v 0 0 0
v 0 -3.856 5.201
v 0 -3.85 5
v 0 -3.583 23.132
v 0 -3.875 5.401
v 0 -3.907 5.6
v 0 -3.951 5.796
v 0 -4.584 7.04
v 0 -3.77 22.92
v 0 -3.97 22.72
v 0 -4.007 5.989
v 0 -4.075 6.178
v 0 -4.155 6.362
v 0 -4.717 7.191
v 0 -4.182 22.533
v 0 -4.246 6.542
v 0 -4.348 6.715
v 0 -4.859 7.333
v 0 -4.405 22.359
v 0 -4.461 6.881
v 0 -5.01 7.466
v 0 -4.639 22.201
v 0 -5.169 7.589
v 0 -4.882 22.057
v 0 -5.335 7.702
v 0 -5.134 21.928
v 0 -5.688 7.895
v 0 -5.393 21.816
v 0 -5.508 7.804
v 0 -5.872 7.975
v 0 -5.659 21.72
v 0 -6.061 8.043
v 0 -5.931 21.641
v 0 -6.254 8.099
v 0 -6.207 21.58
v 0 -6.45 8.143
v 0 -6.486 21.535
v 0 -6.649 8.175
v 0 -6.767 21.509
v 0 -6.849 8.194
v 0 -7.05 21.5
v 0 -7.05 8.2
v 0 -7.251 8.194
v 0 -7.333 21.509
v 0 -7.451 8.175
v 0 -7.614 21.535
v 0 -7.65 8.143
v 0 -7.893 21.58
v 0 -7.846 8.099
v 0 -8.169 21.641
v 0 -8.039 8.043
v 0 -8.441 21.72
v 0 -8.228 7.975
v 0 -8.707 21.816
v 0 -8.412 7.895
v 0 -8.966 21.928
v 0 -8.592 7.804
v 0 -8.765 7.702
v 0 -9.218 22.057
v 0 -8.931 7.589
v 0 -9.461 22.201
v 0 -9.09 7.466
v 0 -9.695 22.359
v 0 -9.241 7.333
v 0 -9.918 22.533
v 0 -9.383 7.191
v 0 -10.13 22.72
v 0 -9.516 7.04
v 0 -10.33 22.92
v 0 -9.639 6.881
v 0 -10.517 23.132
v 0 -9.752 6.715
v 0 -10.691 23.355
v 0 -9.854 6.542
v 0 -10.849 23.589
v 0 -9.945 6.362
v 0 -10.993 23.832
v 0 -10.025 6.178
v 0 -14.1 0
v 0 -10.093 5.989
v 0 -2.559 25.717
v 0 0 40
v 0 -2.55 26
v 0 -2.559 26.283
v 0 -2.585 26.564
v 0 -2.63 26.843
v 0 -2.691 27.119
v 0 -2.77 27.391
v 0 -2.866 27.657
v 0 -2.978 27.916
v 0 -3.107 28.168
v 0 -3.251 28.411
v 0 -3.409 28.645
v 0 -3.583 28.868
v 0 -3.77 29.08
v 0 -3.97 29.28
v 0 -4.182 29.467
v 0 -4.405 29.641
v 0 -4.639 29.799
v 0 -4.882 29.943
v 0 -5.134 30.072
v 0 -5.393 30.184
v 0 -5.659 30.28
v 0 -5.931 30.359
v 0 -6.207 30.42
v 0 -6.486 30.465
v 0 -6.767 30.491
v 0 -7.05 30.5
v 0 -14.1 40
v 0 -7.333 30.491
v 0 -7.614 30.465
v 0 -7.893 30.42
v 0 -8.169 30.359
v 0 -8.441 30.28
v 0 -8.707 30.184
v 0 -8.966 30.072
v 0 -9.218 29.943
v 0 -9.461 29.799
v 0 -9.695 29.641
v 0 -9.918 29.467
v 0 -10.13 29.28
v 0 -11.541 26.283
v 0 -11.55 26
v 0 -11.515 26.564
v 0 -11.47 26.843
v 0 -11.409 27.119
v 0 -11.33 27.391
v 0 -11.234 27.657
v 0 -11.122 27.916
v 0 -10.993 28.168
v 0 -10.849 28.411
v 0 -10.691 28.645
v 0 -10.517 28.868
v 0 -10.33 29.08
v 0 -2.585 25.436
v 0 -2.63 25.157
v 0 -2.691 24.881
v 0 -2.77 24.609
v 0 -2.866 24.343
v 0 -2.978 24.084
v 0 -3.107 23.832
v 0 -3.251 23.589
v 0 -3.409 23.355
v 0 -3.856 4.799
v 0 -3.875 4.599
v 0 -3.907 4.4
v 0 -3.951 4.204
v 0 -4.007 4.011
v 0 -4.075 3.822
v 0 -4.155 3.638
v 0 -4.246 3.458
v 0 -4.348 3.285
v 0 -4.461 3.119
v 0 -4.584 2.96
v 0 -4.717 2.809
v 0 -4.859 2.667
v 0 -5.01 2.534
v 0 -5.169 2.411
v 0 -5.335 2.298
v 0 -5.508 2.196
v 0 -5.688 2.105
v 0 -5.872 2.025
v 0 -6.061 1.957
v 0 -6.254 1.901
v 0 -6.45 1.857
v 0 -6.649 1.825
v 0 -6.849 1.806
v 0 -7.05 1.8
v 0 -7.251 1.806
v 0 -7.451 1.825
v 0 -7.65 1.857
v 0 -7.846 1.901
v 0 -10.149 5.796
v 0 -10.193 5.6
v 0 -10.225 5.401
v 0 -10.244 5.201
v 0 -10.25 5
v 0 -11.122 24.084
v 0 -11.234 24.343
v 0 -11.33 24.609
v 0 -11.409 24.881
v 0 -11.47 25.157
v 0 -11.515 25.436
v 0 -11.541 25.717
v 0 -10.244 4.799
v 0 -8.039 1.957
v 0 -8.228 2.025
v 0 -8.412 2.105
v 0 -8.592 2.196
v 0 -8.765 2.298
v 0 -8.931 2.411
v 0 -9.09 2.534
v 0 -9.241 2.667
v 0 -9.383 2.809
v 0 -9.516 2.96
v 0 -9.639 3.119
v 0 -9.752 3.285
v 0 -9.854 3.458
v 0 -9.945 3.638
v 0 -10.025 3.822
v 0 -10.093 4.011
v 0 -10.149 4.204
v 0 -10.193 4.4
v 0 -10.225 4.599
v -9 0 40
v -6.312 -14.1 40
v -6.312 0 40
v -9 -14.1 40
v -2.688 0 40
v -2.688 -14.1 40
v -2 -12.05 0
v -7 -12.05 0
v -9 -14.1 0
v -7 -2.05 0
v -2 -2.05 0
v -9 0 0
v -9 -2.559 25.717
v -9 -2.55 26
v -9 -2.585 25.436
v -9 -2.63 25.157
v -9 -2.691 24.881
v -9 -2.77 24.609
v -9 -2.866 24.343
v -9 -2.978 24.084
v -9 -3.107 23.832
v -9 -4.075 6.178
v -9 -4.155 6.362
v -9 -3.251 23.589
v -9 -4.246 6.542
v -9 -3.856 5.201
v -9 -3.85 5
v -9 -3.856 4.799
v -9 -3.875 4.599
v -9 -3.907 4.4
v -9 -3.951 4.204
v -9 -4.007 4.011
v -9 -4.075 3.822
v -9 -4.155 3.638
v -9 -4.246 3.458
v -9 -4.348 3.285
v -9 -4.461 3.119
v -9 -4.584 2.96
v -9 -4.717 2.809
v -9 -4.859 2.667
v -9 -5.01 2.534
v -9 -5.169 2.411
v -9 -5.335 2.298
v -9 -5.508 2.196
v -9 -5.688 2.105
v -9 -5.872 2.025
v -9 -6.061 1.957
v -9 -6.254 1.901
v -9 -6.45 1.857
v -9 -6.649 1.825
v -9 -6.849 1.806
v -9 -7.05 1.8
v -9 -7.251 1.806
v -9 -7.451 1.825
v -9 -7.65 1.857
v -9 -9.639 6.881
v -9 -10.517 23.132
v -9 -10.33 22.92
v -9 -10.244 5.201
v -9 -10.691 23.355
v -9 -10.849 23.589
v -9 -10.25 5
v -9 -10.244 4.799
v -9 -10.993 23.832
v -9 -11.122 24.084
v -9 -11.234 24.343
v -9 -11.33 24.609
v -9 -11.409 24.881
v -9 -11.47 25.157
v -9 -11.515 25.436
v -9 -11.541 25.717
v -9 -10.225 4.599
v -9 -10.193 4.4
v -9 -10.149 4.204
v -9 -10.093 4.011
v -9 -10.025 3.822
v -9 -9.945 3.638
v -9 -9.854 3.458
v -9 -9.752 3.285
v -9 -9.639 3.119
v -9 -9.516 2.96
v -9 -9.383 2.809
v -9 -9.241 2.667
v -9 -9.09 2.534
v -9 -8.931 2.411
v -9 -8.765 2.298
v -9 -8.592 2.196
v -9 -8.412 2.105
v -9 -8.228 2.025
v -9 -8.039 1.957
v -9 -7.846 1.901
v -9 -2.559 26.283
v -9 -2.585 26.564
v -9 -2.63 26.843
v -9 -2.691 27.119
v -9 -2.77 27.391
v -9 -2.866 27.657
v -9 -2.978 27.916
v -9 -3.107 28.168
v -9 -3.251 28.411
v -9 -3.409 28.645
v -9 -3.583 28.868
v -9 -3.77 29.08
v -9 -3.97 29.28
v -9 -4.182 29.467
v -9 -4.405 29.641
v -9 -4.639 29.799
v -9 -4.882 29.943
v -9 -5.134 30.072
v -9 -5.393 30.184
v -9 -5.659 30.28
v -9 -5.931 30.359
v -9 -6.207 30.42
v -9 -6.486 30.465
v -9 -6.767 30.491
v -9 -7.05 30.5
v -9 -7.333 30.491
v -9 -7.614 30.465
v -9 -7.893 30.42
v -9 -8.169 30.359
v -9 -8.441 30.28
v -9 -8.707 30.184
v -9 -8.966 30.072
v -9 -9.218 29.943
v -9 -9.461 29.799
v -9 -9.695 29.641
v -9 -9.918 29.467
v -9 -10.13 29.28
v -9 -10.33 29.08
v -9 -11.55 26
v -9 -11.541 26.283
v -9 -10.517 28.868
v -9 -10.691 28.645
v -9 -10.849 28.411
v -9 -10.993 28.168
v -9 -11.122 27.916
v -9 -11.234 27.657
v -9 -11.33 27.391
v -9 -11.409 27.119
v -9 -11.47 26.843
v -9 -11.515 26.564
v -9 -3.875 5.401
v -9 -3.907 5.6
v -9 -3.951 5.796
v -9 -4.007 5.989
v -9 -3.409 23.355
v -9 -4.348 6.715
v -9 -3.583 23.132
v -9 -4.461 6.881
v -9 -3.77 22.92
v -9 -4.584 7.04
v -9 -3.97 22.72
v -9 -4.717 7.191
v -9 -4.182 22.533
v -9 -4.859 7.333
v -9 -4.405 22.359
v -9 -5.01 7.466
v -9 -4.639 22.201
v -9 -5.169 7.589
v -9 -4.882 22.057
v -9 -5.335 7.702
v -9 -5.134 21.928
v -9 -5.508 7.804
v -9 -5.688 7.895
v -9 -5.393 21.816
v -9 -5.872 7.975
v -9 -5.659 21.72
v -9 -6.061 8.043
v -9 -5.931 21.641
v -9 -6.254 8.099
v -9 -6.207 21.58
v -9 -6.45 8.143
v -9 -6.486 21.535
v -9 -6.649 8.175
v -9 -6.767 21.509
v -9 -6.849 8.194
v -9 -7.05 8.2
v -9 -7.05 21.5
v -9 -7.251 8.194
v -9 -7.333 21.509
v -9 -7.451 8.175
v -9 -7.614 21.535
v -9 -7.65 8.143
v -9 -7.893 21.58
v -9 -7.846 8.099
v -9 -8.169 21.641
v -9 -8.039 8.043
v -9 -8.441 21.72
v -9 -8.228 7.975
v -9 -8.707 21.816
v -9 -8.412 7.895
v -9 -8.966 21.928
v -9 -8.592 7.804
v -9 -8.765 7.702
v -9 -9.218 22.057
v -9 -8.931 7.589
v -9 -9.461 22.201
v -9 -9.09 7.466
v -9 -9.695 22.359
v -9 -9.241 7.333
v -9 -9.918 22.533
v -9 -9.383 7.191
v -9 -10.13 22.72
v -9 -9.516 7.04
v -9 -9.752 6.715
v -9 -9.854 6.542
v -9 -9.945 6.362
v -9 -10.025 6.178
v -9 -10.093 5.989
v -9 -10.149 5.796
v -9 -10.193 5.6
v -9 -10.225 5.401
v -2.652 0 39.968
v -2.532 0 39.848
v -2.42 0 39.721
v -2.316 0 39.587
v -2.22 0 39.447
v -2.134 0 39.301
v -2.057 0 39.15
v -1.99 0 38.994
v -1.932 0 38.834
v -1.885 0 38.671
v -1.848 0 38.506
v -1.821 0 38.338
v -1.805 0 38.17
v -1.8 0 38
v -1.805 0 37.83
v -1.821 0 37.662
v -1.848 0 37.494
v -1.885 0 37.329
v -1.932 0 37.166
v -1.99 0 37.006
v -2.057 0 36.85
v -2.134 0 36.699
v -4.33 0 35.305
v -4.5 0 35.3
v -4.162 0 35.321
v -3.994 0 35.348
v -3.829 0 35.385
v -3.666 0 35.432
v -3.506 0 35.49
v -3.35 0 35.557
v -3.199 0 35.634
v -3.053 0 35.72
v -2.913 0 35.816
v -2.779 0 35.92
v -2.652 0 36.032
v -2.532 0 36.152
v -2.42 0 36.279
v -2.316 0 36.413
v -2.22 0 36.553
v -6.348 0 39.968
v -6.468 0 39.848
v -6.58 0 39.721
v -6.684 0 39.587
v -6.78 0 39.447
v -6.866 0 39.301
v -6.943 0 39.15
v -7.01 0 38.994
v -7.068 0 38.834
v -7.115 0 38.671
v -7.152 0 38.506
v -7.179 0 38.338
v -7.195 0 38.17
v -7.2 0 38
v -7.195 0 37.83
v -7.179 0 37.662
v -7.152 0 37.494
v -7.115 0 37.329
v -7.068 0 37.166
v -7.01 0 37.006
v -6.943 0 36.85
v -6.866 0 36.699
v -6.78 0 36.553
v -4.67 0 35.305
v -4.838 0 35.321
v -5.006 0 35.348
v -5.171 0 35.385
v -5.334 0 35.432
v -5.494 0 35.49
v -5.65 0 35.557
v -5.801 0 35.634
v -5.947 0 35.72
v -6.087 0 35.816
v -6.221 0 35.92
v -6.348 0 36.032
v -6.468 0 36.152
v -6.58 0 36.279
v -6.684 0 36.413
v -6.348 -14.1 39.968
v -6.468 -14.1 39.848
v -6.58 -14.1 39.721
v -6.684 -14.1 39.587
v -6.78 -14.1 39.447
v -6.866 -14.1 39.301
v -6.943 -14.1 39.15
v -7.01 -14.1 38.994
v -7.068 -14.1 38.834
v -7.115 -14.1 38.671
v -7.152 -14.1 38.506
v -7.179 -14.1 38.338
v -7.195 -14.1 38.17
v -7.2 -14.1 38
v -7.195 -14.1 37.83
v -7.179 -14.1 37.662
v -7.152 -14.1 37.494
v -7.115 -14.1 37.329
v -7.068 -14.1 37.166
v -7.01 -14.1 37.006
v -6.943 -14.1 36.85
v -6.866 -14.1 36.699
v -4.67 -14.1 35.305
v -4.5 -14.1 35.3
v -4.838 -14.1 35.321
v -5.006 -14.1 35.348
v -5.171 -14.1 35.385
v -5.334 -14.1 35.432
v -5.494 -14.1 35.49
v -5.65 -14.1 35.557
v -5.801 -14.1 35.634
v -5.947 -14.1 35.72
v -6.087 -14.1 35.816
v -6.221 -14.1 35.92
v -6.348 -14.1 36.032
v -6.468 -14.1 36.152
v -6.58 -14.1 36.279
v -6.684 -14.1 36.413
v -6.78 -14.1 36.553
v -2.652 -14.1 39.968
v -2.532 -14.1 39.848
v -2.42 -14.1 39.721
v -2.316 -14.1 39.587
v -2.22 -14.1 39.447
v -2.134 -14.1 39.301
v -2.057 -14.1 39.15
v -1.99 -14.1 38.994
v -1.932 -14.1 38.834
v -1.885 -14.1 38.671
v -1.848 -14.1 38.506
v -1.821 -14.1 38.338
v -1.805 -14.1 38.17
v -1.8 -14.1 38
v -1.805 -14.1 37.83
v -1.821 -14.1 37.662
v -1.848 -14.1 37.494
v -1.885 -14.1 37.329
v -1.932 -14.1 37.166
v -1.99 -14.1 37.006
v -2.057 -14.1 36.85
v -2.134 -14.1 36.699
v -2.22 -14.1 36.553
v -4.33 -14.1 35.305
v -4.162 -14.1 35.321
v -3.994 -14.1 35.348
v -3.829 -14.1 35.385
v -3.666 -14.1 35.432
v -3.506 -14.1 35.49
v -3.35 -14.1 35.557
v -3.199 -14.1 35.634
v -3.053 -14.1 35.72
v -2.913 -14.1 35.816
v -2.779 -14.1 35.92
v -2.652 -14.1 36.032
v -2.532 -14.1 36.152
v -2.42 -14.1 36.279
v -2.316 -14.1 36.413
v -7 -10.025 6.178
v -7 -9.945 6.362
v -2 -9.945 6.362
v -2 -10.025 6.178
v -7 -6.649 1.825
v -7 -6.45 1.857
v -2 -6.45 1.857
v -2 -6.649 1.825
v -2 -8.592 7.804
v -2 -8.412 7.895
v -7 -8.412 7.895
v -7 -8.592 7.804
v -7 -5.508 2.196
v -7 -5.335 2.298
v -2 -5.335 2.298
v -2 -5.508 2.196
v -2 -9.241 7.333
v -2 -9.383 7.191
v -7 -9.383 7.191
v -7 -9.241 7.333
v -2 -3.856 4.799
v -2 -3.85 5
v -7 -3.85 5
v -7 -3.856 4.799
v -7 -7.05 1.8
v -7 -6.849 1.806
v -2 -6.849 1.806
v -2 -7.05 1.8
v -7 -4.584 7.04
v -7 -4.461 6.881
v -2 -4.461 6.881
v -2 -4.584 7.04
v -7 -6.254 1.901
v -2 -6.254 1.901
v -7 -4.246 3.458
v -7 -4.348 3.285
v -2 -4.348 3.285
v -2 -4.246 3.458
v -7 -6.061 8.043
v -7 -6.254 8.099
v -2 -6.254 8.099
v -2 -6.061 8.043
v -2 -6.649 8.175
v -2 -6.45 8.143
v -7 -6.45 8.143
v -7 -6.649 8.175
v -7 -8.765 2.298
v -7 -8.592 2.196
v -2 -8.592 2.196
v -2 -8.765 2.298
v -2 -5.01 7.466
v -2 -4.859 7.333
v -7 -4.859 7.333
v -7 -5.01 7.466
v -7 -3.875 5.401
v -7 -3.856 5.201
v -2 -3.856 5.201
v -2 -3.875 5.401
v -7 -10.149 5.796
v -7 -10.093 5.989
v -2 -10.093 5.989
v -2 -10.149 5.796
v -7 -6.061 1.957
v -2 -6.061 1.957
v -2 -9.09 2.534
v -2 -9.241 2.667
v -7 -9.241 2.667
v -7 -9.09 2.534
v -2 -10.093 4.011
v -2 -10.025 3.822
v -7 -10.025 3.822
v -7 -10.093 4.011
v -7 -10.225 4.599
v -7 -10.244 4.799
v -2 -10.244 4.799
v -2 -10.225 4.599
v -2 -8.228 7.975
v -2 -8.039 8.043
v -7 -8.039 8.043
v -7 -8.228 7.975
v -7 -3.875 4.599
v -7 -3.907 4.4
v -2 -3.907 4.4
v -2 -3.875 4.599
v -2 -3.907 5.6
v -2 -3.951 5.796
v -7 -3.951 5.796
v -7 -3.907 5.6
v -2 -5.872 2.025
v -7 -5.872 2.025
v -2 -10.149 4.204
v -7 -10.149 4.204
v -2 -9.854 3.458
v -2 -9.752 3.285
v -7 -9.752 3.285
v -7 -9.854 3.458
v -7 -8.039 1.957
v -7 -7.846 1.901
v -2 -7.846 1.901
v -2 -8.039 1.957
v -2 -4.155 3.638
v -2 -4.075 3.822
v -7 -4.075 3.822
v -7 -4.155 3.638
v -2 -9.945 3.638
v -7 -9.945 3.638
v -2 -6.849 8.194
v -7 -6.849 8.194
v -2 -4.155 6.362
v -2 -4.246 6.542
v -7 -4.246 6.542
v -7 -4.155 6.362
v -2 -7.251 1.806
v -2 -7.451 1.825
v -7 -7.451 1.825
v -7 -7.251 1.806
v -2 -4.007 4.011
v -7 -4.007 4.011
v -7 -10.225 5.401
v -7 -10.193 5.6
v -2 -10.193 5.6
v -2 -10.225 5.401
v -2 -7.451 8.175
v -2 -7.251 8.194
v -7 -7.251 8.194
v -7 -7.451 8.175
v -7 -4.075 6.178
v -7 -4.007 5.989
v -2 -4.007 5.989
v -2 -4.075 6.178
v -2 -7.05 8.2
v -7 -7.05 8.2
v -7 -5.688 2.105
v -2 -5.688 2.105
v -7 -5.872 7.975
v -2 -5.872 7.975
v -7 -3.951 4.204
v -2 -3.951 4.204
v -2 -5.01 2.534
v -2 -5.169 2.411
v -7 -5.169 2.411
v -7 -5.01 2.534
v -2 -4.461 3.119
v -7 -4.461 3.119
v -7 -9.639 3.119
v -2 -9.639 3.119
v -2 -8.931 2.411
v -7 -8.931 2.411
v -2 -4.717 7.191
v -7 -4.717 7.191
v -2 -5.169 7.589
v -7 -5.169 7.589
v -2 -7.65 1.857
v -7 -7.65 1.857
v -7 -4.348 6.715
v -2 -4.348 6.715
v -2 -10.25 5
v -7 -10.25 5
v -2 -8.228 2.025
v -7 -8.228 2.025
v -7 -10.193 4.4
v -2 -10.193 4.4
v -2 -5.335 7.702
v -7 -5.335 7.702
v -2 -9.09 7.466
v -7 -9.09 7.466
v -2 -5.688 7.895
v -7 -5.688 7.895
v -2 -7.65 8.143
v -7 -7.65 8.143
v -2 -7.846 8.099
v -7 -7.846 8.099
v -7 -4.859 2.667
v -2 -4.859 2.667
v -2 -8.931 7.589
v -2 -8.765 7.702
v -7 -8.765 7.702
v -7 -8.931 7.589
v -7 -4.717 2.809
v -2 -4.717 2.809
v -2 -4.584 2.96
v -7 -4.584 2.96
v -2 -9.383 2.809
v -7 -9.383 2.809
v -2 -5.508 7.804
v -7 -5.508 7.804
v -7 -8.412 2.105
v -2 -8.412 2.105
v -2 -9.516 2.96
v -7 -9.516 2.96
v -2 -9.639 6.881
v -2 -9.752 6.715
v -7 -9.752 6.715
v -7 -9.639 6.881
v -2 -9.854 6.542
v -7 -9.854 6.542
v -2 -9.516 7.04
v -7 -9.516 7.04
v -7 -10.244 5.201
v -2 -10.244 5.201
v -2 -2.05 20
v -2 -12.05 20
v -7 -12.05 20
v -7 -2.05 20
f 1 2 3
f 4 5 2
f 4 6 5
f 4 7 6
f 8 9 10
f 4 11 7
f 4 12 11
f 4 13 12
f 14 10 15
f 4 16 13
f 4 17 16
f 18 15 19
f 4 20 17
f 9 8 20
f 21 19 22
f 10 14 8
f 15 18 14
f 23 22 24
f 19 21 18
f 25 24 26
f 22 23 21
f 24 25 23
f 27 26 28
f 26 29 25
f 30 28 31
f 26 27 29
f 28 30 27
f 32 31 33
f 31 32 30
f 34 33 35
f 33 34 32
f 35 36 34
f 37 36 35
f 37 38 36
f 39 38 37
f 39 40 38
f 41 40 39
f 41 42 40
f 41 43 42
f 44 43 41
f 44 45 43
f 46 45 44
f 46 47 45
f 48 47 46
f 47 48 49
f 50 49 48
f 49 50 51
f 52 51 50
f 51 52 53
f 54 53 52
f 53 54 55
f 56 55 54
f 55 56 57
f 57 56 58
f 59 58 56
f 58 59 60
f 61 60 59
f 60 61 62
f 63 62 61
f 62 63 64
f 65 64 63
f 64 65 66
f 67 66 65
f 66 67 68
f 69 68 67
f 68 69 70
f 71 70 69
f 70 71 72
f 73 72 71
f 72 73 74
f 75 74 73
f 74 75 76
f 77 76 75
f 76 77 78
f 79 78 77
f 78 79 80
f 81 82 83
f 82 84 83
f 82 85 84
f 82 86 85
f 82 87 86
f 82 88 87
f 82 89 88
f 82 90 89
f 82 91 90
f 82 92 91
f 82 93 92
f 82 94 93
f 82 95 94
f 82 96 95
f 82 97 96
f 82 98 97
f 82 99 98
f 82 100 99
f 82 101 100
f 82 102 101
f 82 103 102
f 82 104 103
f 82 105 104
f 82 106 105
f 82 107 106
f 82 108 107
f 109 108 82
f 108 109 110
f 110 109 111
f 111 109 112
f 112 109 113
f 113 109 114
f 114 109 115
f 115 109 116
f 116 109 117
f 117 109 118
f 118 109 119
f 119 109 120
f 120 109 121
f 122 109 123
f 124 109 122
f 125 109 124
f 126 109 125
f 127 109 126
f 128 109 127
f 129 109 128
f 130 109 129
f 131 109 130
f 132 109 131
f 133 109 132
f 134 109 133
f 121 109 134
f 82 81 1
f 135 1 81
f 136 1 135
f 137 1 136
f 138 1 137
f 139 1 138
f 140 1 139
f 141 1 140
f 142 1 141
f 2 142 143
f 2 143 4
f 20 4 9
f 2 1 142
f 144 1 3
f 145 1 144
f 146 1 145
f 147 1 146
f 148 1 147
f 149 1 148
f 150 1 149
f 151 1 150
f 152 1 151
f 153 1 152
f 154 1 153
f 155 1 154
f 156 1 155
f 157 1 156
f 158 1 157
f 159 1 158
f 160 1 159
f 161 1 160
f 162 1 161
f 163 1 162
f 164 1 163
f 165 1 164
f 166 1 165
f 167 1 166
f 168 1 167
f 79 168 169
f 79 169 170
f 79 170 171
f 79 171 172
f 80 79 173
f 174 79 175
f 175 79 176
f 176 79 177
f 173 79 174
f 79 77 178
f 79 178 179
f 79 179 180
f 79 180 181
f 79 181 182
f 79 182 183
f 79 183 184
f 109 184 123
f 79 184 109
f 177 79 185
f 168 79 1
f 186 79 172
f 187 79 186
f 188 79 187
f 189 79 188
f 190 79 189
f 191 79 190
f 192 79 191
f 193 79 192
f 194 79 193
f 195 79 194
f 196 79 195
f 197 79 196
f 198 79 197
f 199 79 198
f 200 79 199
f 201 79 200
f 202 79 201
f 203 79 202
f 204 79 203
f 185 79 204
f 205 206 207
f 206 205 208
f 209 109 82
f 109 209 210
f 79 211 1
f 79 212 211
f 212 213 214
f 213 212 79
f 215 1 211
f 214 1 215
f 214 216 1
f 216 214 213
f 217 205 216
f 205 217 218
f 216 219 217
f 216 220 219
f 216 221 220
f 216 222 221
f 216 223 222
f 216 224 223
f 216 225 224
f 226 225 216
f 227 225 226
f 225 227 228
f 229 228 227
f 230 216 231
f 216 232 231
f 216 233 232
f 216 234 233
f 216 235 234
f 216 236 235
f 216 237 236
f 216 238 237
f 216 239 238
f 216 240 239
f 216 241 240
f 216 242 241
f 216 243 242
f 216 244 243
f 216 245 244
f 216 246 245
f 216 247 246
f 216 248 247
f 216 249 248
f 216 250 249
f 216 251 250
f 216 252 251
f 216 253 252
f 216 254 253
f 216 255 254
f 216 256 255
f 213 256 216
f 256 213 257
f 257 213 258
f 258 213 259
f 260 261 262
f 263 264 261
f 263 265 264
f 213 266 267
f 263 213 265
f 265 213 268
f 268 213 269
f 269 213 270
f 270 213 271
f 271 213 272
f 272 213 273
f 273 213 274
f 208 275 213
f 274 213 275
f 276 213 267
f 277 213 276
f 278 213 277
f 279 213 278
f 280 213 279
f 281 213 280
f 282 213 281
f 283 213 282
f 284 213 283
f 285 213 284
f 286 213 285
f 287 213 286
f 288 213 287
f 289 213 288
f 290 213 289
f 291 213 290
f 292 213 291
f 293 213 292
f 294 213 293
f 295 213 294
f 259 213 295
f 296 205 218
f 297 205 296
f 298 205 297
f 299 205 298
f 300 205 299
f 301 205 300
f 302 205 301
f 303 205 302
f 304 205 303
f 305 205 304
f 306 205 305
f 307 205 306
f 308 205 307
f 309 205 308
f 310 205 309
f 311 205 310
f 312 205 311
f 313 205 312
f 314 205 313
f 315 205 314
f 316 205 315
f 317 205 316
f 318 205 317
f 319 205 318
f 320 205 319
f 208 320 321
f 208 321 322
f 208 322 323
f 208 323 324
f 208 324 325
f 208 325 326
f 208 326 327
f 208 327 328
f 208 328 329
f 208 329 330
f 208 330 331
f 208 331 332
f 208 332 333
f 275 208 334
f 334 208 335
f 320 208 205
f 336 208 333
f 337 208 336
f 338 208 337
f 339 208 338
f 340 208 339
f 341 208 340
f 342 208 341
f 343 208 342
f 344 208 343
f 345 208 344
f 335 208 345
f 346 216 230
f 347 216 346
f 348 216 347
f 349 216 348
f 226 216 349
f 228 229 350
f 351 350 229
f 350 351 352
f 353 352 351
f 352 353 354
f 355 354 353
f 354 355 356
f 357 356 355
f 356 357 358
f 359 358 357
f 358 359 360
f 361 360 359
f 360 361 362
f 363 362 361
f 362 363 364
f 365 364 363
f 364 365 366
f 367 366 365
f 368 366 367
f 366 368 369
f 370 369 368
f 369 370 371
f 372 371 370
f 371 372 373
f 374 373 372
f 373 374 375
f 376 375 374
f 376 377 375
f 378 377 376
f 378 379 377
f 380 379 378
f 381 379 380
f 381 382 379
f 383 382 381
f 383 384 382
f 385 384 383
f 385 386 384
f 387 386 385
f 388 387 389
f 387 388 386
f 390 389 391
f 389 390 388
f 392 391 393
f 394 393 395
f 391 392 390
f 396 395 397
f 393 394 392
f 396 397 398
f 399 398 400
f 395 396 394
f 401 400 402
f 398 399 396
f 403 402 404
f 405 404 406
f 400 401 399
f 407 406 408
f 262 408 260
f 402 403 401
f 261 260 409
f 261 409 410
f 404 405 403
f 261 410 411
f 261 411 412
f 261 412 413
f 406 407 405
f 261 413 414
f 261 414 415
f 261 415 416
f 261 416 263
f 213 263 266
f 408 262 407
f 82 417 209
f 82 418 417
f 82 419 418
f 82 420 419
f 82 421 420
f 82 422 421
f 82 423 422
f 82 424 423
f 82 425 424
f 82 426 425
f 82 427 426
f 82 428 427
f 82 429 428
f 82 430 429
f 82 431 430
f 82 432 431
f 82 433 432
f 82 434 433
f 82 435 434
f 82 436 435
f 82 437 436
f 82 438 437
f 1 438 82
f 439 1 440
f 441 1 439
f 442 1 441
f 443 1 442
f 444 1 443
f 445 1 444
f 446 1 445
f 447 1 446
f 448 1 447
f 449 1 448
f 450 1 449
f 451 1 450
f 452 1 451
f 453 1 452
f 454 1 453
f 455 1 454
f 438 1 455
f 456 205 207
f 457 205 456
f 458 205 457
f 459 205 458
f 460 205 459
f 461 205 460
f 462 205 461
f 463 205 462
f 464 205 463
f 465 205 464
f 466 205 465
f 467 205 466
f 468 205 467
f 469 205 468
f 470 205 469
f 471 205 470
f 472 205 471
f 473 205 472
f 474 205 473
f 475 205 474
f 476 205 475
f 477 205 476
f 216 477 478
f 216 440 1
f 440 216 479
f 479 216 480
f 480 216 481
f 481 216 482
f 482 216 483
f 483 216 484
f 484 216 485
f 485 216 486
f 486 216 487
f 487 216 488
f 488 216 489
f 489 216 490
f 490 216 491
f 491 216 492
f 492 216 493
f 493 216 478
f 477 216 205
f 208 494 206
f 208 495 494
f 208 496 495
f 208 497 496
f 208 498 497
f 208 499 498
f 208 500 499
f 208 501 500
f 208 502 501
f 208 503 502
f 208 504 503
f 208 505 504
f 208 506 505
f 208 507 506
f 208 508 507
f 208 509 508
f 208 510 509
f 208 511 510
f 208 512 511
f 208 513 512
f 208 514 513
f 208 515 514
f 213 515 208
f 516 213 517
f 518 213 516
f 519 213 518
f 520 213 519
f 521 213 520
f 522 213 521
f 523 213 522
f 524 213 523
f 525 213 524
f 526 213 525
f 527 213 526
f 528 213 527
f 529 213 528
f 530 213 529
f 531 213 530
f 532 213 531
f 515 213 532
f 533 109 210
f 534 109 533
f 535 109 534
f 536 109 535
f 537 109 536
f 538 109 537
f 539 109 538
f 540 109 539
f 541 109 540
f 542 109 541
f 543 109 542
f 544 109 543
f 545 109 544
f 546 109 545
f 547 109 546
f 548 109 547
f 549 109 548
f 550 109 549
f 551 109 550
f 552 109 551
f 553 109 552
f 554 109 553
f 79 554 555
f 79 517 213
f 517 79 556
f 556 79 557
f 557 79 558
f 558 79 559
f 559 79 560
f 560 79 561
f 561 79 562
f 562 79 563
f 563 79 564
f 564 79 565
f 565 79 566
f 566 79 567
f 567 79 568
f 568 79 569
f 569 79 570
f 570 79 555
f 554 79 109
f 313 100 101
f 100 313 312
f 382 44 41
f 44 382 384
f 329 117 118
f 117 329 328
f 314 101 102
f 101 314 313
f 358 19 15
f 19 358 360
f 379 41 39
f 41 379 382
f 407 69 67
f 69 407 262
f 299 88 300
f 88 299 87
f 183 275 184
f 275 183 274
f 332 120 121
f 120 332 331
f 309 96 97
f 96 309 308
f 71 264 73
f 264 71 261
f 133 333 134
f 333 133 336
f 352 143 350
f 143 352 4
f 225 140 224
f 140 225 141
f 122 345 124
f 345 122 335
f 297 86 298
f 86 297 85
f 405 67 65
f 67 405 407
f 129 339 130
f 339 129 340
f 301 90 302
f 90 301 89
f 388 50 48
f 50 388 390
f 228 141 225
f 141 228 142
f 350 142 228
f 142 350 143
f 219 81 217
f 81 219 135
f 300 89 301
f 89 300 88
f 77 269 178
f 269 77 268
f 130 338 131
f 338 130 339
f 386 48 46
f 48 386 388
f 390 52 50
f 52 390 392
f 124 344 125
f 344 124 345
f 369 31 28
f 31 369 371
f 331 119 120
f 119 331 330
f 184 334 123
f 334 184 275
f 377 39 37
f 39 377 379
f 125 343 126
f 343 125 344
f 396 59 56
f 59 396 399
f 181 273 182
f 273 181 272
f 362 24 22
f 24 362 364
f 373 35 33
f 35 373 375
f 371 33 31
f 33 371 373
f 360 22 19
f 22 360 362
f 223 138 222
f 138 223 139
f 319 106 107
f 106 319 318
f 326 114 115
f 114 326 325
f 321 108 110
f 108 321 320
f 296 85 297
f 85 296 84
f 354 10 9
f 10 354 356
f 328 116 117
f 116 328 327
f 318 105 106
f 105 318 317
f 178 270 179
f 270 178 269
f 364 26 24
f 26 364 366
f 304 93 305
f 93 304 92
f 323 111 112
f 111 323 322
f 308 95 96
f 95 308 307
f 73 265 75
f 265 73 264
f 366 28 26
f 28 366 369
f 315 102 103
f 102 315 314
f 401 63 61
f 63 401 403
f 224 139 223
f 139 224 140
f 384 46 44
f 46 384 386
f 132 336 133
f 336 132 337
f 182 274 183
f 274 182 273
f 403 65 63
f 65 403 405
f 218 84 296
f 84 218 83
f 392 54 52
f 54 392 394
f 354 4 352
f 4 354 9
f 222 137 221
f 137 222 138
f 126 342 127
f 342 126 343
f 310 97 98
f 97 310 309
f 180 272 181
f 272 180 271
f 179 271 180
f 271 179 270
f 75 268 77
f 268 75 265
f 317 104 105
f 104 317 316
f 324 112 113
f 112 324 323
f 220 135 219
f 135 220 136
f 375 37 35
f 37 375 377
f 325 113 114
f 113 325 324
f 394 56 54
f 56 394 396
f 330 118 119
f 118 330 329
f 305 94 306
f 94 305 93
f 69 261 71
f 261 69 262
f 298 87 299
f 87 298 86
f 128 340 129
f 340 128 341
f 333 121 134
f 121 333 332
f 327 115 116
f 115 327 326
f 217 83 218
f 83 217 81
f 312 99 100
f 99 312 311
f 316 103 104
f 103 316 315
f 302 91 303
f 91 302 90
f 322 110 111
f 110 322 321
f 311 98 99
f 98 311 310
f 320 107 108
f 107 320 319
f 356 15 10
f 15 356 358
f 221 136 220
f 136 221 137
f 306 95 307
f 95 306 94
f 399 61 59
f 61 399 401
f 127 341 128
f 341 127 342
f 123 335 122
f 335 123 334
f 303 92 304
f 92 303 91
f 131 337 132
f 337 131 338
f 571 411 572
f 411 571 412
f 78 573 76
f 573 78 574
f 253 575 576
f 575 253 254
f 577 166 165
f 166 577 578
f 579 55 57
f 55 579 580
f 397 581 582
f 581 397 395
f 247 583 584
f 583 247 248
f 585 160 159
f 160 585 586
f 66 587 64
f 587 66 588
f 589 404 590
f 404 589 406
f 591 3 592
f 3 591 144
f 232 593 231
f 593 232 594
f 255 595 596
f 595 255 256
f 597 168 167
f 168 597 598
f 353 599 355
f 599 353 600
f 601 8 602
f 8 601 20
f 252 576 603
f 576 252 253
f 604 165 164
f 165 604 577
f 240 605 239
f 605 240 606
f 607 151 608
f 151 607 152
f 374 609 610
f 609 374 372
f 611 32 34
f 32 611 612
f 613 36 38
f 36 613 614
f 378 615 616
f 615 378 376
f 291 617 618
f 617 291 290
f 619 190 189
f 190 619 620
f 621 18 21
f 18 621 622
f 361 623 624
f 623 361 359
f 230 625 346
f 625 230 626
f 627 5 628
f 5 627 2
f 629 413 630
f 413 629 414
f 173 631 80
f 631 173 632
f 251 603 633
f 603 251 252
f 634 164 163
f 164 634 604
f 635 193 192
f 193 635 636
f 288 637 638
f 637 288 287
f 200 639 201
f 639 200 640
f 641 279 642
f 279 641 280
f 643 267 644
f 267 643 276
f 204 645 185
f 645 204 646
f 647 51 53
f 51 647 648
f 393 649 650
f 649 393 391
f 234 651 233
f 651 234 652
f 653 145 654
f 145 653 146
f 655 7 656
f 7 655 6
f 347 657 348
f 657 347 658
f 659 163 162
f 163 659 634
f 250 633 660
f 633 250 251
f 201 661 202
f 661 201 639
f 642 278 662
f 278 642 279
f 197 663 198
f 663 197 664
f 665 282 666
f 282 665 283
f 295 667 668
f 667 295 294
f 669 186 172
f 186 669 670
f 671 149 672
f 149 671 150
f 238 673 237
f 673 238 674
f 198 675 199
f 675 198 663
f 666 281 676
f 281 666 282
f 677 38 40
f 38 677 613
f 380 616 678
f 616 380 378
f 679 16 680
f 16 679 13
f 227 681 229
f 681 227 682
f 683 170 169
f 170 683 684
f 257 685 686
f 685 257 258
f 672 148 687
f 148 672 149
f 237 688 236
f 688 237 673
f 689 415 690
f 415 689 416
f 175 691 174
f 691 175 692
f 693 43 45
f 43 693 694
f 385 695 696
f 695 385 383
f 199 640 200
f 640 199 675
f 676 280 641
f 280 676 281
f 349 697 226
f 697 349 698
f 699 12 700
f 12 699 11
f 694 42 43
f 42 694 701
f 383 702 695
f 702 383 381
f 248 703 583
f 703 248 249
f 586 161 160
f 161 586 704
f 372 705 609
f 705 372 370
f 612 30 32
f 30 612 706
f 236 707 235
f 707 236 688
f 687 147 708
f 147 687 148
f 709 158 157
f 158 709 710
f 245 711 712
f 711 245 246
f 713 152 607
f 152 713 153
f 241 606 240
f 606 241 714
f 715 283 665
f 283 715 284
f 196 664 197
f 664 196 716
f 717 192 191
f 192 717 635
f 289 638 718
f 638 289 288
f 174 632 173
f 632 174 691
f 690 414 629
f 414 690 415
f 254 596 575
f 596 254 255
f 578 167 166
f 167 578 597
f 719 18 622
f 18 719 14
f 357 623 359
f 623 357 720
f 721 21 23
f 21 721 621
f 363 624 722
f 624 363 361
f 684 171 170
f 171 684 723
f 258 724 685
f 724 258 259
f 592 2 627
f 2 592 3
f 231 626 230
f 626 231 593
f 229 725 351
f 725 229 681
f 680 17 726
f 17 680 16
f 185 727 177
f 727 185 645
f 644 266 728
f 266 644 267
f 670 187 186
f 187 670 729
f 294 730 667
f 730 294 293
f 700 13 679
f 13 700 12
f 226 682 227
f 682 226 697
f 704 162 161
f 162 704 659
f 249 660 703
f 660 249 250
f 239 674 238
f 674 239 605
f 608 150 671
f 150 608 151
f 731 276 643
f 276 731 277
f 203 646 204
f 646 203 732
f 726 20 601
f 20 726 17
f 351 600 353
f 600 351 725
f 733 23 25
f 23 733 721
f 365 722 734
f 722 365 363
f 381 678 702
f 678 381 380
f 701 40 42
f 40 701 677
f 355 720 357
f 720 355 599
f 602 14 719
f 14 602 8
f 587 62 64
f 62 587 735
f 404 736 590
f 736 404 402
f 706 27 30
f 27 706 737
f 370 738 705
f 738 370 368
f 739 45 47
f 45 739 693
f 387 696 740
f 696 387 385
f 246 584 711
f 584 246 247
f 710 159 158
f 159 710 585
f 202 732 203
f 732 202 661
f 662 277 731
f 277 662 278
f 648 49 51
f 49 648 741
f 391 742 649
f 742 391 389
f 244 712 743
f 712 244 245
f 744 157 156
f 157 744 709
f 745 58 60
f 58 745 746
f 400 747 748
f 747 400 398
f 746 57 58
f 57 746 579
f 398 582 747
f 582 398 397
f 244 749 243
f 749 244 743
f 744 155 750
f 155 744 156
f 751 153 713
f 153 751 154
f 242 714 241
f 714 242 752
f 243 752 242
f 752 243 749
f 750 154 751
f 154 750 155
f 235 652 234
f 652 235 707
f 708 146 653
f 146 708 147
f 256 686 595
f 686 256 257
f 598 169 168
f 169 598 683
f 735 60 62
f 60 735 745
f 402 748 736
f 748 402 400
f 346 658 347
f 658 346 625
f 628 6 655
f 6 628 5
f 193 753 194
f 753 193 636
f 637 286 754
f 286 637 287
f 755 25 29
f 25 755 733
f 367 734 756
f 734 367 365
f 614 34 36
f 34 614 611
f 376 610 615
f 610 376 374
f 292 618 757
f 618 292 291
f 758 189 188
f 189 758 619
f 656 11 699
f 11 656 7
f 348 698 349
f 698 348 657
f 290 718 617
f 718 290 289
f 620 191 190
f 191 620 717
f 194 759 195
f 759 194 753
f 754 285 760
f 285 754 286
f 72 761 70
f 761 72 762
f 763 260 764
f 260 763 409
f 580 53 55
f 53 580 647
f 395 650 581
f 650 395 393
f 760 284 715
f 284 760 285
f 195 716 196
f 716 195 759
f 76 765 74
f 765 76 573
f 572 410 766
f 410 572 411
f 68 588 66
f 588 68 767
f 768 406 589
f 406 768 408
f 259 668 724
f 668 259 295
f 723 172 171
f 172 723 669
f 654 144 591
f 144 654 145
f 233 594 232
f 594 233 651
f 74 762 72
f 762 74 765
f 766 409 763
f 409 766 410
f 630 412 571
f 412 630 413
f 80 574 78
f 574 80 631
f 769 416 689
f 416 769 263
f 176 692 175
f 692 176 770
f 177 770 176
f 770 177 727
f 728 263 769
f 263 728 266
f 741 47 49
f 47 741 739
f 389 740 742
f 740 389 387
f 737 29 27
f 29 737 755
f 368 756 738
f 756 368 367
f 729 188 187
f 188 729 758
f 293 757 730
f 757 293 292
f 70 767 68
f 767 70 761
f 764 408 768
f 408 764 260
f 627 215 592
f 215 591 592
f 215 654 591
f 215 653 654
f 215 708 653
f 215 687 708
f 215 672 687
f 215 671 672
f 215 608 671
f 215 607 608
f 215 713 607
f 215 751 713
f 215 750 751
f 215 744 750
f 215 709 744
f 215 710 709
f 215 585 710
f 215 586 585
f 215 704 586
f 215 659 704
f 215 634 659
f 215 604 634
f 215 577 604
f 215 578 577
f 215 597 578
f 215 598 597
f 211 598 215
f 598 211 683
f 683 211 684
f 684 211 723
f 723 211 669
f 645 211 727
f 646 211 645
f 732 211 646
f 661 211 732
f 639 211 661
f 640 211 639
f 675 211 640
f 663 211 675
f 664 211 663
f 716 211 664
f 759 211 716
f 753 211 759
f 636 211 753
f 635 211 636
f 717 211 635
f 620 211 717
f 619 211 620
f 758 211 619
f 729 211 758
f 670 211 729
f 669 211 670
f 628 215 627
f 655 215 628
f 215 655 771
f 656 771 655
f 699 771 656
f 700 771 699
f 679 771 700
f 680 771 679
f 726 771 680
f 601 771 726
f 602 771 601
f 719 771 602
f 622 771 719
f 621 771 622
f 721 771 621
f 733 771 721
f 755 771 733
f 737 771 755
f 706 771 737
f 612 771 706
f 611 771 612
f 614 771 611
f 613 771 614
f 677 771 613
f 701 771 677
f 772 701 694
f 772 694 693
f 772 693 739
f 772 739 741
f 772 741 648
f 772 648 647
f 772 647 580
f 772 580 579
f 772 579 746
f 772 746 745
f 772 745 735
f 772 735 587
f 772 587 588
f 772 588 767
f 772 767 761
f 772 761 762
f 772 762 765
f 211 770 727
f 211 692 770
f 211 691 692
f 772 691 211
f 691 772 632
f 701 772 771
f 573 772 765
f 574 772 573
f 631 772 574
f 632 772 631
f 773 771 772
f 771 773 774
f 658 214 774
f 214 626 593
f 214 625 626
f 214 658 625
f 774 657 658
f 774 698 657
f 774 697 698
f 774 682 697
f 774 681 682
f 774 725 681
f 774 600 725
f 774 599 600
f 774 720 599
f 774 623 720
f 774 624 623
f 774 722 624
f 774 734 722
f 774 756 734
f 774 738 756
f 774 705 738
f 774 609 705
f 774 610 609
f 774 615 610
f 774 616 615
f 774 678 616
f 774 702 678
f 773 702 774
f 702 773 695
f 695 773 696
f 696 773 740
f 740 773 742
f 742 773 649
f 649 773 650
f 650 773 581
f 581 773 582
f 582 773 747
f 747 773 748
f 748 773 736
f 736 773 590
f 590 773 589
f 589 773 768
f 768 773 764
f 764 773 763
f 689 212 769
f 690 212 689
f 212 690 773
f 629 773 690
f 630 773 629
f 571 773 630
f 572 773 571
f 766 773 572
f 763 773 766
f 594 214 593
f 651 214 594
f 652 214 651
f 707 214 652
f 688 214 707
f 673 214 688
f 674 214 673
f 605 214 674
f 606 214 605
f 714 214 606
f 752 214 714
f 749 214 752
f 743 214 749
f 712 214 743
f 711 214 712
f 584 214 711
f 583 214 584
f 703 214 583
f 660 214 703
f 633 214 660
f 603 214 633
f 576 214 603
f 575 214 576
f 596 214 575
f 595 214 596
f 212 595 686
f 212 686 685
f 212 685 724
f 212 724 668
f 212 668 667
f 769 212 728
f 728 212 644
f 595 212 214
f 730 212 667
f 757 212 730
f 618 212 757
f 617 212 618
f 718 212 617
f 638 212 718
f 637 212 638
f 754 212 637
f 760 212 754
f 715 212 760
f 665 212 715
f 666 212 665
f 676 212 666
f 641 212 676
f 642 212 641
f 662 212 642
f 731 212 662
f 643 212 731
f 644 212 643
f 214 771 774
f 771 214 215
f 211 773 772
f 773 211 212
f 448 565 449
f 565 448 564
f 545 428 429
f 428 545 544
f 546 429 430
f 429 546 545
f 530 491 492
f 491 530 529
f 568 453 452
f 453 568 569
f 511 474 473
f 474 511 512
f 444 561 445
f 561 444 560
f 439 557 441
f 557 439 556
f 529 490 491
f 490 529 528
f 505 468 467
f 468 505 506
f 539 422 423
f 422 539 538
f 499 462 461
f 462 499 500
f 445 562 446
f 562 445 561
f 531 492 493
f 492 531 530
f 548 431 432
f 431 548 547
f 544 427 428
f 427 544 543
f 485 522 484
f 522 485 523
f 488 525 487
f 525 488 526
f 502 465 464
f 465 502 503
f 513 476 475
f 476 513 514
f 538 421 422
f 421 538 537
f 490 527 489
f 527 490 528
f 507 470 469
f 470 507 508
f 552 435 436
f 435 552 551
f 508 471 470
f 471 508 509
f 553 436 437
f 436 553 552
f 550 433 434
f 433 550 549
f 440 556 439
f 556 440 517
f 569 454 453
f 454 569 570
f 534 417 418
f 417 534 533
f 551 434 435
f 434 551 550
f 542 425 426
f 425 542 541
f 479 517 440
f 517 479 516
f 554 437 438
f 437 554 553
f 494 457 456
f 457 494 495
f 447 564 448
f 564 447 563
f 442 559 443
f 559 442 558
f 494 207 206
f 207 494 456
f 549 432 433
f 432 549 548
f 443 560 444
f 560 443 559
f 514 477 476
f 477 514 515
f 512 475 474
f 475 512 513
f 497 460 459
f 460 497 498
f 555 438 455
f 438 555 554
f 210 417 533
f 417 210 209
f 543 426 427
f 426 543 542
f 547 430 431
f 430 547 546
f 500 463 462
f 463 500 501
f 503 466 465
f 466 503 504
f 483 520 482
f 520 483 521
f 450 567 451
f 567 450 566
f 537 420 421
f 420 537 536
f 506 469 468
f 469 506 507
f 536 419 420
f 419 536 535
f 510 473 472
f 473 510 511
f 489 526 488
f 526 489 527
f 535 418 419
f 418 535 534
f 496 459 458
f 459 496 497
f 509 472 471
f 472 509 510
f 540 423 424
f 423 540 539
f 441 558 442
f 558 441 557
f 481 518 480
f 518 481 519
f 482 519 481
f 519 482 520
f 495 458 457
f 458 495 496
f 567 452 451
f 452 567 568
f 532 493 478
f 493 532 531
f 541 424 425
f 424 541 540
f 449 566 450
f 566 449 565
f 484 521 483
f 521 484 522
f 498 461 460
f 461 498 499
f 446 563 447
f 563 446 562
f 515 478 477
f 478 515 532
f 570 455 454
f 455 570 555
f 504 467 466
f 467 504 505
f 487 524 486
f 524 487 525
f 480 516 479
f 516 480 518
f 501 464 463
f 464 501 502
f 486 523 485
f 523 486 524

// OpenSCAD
$fn = 100;

bottomThickness = 1.5;
wallThickness = 1.5;

screwRadiusM3 = 1.45;
screwRadiusM4 = 1.75;
screwRadiusM3Smooth = 1.6;
smoothRodRadius = 8.2/2;


axisSectionDepth = 40;


boxHeight = 48; // 60


cart();


motorConnectorHeight = 42;
module cart() {
    thickness = 9;
    padding = 5;
    depth = smoothRodRadius + padding * 2;
    height = 40;
    
    nutThickness = 5;
    nutDepth = 10;

    hoseRadius = 5.4/2;
    
    threadedRodSmoothRadius = 3.2;

    difference() {
        translate([-thickness, -depth, 0])
        cube([thickness, depth, height]);
        
        
        translate([-thickness, -depth/2, motorConnectorHeight/2 + padding])
        rotate([0, 90, 0])
        cylinder(r=smoothRodRadius + .4, thickness);
        
        translate([-thickness, -depth/2, padding])
        rotate([0, 90, 0])
        cylinder(r=threadedRodSmoothRadius, thickness);

        translate([-thickness / 2, -depth / 2, 0])
        cube([nutThickness, nutDepth, 40], true);
        
        translate([-thickness / 2, 0, height - 2])
        rotate([90, 0, 0])
        cylinder(r=hoseRadius, depth);
    }

}
